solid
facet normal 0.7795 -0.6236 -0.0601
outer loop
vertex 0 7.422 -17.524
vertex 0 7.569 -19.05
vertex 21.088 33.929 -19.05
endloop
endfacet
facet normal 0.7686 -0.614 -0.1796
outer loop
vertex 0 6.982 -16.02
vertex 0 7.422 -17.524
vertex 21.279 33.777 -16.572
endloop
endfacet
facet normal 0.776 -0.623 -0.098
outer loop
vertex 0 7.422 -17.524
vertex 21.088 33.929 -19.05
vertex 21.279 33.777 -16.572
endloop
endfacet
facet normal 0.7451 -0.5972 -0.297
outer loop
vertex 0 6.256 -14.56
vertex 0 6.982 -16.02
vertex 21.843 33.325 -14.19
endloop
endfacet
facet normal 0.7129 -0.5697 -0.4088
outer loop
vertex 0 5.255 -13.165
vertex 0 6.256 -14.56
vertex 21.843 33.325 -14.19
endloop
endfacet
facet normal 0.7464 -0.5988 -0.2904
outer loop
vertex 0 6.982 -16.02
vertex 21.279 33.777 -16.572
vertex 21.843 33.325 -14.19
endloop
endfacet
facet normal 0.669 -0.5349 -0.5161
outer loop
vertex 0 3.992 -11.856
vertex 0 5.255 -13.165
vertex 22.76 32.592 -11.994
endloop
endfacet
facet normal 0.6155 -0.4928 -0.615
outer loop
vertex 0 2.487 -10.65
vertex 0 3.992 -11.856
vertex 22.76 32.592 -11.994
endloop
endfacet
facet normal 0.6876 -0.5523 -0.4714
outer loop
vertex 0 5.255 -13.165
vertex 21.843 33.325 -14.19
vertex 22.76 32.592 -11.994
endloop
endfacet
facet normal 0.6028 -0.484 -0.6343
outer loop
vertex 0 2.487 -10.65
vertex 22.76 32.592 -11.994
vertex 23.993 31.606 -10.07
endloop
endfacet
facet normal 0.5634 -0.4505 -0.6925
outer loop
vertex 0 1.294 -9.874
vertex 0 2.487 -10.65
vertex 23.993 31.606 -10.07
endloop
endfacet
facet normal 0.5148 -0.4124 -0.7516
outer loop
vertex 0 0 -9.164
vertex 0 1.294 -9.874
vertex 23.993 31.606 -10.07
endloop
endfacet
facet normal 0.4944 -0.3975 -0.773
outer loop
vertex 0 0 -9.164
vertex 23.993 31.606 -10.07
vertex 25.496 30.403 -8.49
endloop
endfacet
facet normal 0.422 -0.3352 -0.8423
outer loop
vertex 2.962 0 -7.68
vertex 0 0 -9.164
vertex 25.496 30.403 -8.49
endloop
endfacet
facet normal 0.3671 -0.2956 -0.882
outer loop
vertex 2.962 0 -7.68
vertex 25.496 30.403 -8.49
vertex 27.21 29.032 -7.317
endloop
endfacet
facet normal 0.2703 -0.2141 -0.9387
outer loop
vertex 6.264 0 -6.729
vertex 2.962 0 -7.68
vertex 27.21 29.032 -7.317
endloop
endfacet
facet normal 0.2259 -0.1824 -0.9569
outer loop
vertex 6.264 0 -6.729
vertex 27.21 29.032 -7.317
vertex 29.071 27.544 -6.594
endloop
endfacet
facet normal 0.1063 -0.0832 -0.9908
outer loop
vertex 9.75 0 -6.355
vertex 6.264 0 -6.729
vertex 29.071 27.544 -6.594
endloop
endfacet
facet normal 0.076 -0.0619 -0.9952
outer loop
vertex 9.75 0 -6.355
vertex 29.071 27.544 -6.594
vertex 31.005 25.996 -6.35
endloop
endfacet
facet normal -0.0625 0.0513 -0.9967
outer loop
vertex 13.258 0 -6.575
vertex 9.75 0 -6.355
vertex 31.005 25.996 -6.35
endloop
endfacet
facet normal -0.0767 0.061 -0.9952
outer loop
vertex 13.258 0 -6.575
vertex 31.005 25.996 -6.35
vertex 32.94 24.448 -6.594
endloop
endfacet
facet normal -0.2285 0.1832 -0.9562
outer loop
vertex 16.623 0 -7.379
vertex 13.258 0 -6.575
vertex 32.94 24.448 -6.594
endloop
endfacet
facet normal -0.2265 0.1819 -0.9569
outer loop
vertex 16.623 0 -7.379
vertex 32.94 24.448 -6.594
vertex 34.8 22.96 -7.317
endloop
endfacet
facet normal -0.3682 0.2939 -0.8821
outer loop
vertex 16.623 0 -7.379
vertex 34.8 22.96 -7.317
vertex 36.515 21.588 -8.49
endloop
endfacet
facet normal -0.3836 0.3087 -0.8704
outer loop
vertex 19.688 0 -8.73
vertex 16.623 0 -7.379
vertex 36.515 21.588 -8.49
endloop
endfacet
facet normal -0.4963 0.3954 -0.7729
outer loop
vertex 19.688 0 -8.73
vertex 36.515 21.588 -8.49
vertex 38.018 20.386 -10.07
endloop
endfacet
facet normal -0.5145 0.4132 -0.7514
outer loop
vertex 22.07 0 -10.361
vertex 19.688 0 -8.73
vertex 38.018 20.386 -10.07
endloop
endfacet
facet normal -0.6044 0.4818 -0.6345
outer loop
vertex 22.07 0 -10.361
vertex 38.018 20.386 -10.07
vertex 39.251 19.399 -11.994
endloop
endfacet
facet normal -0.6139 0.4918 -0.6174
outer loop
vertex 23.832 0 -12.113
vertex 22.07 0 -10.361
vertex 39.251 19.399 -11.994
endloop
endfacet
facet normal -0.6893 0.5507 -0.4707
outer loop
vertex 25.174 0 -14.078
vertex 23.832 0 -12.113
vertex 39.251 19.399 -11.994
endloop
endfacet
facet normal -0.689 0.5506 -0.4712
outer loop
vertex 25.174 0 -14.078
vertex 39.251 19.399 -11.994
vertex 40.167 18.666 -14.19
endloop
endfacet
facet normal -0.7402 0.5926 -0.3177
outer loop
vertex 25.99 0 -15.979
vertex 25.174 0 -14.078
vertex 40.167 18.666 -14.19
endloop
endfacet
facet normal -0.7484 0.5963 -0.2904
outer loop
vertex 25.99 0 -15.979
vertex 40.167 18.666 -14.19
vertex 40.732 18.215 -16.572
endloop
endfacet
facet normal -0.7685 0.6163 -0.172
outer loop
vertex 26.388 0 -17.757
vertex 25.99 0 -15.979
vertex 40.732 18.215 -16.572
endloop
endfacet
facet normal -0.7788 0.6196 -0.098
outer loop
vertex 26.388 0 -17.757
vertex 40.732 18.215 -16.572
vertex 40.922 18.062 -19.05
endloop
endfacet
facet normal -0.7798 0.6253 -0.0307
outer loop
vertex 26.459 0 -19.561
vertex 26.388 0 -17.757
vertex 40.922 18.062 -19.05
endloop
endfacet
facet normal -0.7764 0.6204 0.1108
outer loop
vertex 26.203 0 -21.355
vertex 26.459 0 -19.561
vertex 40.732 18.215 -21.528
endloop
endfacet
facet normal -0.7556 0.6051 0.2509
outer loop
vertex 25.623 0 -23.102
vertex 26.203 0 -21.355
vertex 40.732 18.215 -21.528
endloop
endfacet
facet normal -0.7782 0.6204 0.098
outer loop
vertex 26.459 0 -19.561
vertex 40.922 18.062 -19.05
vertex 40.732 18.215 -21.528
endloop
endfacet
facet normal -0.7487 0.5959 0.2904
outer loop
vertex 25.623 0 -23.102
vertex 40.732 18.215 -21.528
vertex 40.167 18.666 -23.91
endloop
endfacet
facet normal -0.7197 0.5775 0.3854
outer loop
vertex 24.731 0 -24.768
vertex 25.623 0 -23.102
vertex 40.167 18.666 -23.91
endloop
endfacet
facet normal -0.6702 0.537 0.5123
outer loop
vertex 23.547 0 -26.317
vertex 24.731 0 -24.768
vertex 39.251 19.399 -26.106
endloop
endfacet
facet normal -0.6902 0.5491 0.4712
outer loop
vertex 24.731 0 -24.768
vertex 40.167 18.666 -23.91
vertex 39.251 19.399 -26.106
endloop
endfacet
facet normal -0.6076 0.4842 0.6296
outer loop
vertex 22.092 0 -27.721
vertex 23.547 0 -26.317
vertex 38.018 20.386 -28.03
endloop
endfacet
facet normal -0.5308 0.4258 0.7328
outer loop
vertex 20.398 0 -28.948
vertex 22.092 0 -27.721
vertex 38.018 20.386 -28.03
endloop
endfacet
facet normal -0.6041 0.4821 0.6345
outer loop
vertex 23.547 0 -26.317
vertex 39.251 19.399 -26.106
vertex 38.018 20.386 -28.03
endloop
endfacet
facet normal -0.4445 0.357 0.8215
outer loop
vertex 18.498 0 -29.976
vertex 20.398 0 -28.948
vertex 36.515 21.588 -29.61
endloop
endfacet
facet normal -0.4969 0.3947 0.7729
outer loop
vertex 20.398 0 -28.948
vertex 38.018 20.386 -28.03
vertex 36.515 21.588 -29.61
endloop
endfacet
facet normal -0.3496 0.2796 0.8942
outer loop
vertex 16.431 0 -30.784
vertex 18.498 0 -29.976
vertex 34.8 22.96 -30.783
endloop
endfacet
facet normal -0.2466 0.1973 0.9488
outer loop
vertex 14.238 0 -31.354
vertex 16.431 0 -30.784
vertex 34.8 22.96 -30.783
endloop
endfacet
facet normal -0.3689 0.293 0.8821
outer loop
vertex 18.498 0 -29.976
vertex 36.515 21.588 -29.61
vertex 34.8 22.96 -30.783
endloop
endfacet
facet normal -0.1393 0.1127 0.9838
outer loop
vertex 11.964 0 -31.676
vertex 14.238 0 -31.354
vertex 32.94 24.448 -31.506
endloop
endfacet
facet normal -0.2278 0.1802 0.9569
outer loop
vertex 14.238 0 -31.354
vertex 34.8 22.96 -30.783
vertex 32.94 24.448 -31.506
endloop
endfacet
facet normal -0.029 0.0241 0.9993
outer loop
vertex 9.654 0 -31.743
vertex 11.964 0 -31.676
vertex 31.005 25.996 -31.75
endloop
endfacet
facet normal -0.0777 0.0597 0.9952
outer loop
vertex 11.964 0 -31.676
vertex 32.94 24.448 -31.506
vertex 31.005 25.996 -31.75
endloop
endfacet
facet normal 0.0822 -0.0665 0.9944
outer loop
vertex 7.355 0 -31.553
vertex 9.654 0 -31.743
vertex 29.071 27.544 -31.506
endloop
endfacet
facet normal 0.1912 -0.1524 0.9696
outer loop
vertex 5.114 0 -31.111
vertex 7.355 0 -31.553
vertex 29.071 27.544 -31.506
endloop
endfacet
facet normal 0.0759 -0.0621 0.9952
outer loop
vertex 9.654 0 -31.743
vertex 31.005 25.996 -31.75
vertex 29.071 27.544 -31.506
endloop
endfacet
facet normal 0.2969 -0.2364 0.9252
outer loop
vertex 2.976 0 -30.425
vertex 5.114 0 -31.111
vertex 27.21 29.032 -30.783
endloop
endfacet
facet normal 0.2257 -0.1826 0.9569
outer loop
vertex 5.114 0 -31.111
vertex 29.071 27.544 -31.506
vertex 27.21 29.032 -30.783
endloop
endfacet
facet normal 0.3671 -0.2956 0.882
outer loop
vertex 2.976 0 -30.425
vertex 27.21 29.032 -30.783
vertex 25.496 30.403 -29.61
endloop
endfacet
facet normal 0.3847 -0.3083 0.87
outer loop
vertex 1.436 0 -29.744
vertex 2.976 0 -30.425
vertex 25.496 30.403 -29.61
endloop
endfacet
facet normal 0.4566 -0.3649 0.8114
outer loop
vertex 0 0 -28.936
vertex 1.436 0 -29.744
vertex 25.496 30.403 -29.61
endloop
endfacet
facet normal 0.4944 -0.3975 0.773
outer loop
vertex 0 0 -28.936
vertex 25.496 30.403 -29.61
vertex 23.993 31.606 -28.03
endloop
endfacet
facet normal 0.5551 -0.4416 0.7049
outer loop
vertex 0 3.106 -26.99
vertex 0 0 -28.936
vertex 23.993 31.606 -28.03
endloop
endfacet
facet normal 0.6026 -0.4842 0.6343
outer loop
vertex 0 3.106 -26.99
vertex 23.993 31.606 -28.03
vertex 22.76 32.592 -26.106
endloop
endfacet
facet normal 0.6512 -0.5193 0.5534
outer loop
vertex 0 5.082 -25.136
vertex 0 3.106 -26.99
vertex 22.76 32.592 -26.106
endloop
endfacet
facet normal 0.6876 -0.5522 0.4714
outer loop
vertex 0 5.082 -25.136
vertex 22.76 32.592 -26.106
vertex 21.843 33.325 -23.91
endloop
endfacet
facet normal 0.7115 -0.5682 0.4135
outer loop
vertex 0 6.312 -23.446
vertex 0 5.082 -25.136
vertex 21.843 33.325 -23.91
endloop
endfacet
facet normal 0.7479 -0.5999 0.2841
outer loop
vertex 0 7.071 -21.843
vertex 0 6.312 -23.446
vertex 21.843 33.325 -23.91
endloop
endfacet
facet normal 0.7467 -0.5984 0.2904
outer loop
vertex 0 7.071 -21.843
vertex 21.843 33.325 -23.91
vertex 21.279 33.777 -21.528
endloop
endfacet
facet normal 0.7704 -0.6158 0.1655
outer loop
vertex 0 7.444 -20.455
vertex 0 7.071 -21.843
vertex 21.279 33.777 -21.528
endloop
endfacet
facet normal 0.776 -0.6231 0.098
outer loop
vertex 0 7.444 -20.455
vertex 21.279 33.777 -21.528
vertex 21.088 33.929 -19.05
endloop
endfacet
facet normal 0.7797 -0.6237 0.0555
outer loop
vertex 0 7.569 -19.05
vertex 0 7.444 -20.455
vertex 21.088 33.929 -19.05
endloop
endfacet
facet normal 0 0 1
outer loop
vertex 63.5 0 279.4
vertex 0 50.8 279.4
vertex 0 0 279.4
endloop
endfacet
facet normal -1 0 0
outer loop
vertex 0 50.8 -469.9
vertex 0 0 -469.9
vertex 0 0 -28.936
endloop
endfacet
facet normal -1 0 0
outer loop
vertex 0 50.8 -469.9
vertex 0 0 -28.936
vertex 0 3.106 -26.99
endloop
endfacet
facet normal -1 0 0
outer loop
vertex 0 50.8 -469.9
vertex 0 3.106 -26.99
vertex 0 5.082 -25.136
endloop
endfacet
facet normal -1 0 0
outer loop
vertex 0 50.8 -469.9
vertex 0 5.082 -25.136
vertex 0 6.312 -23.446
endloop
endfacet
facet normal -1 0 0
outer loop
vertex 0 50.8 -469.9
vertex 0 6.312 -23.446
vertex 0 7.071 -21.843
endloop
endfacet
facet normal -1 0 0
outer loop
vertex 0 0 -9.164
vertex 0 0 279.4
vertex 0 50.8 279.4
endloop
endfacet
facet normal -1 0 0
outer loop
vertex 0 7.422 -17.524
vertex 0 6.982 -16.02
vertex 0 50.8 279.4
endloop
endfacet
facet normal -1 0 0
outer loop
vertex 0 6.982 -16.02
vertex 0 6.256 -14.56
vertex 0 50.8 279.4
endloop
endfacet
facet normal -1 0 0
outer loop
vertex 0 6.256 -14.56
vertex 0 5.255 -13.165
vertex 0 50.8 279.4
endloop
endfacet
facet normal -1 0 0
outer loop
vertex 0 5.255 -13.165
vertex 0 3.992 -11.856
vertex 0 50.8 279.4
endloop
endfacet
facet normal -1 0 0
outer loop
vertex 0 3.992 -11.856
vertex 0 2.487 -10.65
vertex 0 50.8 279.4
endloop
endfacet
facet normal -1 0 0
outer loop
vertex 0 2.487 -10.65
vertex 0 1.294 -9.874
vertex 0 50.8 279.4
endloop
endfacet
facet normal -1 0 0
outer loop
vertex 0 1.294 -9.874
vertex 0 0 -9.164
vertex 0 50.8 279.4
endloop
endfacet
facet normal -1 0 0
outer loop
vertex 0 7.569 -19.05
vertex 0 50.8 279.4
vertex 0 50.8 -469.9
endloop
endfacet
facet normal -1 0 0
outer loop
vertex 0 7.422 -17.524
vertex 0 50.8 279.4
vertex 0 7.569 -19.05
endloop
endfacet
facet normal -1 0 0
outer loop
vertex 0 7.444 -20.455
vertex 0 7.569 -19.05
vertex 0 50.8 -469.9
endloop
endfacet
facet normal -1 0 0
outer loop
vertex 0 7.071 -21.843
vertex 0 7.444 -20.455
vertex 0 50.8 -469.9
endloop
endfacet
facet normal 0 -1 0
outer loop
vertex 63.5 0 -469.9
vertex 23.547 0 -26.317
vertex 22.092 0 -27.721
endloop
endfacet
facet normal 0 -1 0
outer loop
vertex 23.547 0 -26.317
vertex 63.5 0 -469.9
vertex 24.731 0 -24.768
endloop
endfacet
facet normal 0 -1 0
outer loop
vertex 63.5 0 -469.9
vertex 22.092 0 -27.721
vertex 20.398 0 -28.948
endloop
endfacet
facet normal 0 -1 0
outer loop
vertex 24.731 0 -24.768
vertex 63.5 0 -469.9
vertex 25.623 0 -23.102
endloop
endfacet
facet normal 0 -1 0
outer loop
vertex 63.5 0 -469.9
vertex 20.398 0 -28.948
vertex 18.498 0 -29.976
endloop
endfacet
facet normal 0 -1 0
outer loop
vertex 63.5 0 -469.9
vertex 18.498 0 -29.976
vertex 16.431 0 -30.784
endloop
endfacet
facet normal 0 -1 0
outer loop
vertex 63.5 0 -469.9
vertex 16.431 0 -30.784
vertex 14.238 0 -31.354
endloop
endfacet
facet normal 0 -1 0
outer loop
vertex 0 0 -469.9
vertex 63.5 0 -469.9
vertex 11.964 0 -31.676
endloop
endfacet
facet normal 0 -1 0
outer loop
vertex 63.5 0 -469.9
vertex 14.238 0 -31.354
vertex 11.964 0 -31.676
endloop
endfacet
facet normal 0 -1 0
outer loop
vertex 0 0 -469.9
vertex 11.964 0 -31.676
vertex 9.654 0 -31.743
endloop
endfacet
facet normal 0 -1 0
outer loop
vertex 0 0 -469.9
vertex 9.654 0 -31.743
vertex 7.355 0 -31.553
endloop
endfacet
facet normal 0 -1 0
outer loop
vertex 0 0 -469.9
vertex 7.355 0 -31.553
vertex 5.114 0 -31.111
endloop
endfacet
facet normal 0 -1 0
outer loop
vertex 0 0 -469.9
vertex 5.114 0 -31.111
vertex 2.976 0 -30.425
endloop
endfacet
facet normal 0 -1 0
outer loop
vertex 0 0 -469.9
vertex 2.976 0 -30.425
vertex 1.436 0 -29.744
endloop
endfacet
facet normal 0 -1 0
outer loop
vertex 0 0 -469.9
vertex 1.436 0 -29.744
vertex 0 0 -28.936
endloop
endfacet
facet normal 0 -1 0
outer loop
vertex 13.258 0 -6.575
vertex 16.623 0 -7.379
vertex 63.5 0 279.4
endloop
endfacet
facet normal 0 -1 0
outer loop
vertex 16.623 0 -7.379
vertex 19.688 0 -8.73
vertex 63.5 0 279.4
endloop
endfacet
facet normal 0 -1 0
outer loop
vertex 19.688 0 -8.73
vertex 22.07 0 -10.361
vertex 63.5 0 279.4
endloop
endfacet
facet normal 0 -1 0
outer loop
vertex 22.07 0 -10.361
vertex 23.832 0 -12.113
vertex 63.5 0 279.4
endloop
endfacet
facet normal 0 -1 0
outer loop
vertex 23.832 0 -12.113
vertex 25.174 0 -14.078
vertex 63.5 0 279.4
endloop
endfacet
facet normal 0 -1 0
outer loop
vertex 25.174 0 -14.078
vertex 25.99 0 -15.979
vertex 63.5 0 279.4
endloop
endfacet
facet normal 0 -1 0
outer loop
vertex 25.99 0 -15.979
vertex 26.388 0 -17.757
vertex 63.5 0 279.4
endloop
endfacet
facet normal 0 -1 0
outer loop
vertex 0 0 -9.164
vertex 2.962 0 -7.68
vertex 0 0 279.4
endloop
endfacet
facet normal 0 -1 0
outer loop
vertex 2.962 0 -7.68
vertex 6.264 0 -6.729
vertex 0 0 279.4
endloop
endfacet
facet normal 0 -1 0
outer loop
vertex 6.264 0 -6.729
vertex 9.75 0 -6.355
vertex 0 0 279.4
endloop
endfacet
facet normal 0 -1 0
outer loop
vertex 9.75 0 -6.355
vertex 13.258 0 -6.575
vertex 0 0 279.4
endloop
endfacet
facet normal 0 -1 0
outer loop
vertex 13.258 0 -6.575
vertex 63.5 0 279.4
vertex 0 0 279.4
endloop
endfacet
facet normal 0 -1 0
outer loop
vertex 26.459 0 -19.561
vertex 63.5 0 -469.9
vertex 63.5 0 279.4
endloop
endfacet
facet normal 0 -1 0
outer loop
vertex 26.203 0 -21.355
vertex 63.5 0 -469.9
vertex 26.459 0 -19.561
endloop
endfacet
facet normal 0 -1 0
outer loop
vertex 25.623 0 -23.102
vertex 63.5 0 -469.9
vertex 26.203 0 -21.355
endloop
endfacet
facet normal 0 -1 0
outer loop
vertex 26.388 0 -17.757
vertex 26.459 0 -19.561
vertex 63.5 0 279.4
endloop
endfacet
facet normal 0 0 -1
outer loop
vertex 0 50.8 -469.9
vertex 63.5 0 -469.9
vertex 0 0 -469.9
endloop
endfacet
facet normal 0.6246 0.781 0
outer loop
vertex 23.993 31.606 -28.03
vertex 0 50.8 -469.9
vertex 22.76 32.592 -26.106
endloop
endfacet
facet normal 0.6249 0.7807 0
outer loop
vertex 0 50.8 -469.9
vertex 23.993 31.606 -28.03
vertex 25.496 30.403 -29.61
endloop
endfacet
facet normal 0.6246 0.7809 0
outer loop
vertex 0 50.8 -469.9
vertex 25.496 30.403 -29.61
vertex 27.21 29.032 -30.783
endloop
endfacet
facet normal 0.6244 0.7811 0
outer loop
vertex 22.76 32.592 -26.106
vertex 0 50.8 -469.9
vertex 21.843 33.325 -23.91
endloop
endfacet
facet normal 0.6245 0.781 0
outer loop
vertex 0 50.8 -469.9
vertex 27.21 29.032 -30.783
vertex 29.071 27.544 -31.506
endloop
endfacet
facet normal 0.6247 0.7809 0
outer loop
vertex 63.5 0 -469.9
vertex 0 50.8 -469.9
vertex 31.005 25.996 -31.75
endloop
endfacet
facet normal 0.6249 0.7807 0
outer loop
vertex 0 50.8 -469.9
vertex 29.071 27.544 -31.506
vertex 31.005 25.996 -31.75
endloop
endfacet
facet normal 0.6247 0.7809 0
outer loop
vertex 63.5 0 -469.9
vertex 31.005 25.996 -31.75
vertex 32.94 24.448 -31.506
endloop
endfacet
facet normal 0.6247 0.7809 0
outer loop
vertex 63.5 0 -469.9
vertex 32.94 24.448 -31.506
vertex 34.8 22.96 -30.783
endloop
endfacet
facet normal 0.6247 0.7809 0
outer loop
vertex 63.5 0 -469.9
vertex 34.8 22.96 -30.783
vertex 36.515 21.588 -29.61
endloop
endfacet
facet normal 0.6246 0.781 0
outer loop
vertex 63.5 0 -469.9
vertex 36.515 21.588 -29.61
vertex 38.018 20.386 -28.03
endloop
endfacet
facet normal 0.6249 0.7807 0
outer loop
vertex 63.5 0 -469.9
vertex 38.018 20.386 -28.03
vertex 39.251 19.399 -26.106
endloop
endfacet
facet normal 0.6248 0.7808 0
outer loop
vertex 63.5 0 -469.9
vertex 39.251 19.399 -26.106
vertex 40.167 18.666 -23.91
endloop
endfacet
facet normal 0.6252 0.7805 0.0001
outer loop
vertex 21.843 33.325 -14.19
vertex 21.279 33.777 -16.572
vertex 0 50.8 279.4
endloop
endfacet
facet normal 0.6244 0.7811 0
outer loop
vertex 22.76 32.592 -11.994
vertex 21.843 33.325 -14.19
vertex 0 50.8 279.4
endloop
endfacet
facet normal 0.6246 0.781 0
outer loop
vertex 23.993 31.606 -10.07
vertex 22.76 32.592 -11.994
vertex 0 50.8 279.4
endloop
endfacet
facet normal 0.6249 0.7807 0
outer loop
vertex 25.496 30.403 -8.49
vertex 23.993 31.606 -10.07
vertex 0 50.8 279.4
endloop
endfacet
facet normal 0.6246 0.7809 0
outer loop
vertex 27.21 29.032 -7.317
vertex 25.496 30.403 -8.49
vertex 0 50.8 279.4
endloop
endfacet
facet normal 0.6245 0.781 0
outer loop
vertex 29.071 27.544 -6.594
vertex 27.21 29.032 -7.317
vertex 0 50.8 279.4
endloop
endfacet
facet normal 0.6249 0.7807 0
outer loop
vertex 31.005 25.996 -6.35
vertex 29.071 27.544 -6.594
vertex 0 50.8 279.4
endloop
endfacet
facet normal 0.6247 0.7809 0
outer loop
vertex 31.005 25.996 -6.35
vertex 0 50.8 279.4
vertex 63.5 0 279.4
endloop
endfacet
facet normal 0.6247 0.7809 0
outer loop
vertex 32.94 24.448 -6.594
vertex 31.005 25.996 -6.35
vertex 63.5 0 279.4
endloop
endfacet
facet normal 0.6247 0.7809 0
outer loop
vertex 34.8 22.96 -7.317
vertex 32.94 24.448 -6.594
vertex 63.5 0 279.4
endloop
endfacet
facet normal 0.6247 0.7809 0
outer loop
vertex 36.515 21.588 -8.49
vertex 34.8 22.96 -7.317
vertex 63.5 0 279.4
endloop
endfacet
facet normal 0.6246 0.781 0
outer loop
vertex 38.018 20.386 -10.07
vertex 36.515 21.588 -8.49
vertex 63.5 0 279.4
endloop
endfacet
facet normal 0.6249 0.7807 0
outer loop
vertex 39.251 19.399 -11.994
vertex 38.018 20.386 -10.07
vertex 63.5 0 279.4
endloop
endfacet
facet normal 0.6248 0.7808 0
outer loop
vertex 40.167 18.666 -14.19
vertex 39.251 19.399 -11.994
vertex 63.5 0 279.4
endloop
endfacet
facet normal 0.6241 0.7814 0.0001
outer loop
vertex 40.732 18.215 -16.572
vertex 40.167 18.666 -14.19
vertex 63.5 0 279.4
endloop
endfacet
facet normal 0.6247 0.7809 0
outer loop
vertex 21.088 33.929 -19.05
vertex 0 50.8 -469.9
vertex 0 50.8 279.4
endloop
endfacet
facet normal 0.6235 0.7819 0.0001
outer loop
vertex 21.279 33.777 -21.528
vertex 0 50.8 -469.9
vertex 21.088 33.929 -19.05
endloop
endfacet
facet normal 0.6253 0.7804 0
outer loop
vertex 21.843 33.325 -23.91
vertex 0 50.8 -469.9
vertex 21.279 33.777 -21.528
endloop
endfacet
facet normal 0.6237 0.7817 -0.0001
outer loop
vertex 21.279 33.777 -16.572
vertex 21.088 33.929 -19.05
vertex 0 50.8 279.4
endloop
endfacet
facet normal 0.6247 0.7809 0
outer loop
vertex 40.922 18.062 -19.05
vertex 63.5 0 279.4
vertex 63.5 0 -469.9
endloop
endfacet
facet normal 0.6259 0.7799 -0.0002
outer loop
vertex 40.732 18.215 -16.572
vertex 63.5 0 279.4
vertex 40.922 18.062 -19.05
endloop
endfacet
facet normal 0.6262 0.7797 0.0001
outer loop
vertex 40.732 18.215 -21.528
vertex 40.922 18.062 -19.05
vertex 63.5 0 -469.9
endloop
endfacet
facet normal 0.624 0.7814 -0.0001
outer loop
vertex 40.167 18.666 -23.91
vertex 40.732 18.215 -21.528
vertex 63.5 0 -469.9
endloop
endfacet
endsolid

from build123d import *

# Parameters (mm, degrees)
BOSS_EXTRUDE1_DEPTH = 38.1
SKETCH2_R           = 12.7
CUT_EXTRUDE1_DEPTH  = 63.532383805
BOSS_EXTRUDE2_DEPTH = 279.4
BOSS_EXTRUDE3_DEPTH = 431.8


with BuildPart() as part:
    # Sketch1 → Boss-Extrude1 (new body)
    with BuildSketch(Plane.XY):
        Polygon((0, 0), (0, 50.8), (63.5, 0), align=None)
    extrude(amount=-BOSS_EXTRUDE1_DEPTH)

    # Sketch2 → Cut-Extrude1 (cut, through all)
    with BuildSketch(Plane(origin=(24.780487805, 30.975609756, 0), x_dir=(0.7808688094430303, -0.6246950475544244, 0), z_dir=(0.6246950475544244, 0.7808688094430304, 0))):
        with Locations(Location((7.971690031, 19.05, 0), (0, 0, 180))):
            Circle(SKETCH2_R)
    extrude(amount=-CUT_EXTRUDE1_DEPTH, mode=Mode.SUBTRACT)

    # Sketch3 → Boss-Extrude2 (add)
    with BuildSketch(Plane.XY):
        Polygon((0, 50.8), (0, 0), (63.5, 0), align=None)
    extrude(amount=BOSS_EXTRUDE2_DEPTH)

    # Sketch4 → Boss-Extrude3 (add)
    with BuildSketch(Plane(origin=(0, 0, -38.1), x_dir=(-1, 0, 0), z_dir=(0, 0, -1))):
        Polygon((0, 50.8), (-63.5, 0), (0, 0), align=None)
    extrude(amount=BOSS_EXTRUDE3_DEPTH)


solid = part.part
